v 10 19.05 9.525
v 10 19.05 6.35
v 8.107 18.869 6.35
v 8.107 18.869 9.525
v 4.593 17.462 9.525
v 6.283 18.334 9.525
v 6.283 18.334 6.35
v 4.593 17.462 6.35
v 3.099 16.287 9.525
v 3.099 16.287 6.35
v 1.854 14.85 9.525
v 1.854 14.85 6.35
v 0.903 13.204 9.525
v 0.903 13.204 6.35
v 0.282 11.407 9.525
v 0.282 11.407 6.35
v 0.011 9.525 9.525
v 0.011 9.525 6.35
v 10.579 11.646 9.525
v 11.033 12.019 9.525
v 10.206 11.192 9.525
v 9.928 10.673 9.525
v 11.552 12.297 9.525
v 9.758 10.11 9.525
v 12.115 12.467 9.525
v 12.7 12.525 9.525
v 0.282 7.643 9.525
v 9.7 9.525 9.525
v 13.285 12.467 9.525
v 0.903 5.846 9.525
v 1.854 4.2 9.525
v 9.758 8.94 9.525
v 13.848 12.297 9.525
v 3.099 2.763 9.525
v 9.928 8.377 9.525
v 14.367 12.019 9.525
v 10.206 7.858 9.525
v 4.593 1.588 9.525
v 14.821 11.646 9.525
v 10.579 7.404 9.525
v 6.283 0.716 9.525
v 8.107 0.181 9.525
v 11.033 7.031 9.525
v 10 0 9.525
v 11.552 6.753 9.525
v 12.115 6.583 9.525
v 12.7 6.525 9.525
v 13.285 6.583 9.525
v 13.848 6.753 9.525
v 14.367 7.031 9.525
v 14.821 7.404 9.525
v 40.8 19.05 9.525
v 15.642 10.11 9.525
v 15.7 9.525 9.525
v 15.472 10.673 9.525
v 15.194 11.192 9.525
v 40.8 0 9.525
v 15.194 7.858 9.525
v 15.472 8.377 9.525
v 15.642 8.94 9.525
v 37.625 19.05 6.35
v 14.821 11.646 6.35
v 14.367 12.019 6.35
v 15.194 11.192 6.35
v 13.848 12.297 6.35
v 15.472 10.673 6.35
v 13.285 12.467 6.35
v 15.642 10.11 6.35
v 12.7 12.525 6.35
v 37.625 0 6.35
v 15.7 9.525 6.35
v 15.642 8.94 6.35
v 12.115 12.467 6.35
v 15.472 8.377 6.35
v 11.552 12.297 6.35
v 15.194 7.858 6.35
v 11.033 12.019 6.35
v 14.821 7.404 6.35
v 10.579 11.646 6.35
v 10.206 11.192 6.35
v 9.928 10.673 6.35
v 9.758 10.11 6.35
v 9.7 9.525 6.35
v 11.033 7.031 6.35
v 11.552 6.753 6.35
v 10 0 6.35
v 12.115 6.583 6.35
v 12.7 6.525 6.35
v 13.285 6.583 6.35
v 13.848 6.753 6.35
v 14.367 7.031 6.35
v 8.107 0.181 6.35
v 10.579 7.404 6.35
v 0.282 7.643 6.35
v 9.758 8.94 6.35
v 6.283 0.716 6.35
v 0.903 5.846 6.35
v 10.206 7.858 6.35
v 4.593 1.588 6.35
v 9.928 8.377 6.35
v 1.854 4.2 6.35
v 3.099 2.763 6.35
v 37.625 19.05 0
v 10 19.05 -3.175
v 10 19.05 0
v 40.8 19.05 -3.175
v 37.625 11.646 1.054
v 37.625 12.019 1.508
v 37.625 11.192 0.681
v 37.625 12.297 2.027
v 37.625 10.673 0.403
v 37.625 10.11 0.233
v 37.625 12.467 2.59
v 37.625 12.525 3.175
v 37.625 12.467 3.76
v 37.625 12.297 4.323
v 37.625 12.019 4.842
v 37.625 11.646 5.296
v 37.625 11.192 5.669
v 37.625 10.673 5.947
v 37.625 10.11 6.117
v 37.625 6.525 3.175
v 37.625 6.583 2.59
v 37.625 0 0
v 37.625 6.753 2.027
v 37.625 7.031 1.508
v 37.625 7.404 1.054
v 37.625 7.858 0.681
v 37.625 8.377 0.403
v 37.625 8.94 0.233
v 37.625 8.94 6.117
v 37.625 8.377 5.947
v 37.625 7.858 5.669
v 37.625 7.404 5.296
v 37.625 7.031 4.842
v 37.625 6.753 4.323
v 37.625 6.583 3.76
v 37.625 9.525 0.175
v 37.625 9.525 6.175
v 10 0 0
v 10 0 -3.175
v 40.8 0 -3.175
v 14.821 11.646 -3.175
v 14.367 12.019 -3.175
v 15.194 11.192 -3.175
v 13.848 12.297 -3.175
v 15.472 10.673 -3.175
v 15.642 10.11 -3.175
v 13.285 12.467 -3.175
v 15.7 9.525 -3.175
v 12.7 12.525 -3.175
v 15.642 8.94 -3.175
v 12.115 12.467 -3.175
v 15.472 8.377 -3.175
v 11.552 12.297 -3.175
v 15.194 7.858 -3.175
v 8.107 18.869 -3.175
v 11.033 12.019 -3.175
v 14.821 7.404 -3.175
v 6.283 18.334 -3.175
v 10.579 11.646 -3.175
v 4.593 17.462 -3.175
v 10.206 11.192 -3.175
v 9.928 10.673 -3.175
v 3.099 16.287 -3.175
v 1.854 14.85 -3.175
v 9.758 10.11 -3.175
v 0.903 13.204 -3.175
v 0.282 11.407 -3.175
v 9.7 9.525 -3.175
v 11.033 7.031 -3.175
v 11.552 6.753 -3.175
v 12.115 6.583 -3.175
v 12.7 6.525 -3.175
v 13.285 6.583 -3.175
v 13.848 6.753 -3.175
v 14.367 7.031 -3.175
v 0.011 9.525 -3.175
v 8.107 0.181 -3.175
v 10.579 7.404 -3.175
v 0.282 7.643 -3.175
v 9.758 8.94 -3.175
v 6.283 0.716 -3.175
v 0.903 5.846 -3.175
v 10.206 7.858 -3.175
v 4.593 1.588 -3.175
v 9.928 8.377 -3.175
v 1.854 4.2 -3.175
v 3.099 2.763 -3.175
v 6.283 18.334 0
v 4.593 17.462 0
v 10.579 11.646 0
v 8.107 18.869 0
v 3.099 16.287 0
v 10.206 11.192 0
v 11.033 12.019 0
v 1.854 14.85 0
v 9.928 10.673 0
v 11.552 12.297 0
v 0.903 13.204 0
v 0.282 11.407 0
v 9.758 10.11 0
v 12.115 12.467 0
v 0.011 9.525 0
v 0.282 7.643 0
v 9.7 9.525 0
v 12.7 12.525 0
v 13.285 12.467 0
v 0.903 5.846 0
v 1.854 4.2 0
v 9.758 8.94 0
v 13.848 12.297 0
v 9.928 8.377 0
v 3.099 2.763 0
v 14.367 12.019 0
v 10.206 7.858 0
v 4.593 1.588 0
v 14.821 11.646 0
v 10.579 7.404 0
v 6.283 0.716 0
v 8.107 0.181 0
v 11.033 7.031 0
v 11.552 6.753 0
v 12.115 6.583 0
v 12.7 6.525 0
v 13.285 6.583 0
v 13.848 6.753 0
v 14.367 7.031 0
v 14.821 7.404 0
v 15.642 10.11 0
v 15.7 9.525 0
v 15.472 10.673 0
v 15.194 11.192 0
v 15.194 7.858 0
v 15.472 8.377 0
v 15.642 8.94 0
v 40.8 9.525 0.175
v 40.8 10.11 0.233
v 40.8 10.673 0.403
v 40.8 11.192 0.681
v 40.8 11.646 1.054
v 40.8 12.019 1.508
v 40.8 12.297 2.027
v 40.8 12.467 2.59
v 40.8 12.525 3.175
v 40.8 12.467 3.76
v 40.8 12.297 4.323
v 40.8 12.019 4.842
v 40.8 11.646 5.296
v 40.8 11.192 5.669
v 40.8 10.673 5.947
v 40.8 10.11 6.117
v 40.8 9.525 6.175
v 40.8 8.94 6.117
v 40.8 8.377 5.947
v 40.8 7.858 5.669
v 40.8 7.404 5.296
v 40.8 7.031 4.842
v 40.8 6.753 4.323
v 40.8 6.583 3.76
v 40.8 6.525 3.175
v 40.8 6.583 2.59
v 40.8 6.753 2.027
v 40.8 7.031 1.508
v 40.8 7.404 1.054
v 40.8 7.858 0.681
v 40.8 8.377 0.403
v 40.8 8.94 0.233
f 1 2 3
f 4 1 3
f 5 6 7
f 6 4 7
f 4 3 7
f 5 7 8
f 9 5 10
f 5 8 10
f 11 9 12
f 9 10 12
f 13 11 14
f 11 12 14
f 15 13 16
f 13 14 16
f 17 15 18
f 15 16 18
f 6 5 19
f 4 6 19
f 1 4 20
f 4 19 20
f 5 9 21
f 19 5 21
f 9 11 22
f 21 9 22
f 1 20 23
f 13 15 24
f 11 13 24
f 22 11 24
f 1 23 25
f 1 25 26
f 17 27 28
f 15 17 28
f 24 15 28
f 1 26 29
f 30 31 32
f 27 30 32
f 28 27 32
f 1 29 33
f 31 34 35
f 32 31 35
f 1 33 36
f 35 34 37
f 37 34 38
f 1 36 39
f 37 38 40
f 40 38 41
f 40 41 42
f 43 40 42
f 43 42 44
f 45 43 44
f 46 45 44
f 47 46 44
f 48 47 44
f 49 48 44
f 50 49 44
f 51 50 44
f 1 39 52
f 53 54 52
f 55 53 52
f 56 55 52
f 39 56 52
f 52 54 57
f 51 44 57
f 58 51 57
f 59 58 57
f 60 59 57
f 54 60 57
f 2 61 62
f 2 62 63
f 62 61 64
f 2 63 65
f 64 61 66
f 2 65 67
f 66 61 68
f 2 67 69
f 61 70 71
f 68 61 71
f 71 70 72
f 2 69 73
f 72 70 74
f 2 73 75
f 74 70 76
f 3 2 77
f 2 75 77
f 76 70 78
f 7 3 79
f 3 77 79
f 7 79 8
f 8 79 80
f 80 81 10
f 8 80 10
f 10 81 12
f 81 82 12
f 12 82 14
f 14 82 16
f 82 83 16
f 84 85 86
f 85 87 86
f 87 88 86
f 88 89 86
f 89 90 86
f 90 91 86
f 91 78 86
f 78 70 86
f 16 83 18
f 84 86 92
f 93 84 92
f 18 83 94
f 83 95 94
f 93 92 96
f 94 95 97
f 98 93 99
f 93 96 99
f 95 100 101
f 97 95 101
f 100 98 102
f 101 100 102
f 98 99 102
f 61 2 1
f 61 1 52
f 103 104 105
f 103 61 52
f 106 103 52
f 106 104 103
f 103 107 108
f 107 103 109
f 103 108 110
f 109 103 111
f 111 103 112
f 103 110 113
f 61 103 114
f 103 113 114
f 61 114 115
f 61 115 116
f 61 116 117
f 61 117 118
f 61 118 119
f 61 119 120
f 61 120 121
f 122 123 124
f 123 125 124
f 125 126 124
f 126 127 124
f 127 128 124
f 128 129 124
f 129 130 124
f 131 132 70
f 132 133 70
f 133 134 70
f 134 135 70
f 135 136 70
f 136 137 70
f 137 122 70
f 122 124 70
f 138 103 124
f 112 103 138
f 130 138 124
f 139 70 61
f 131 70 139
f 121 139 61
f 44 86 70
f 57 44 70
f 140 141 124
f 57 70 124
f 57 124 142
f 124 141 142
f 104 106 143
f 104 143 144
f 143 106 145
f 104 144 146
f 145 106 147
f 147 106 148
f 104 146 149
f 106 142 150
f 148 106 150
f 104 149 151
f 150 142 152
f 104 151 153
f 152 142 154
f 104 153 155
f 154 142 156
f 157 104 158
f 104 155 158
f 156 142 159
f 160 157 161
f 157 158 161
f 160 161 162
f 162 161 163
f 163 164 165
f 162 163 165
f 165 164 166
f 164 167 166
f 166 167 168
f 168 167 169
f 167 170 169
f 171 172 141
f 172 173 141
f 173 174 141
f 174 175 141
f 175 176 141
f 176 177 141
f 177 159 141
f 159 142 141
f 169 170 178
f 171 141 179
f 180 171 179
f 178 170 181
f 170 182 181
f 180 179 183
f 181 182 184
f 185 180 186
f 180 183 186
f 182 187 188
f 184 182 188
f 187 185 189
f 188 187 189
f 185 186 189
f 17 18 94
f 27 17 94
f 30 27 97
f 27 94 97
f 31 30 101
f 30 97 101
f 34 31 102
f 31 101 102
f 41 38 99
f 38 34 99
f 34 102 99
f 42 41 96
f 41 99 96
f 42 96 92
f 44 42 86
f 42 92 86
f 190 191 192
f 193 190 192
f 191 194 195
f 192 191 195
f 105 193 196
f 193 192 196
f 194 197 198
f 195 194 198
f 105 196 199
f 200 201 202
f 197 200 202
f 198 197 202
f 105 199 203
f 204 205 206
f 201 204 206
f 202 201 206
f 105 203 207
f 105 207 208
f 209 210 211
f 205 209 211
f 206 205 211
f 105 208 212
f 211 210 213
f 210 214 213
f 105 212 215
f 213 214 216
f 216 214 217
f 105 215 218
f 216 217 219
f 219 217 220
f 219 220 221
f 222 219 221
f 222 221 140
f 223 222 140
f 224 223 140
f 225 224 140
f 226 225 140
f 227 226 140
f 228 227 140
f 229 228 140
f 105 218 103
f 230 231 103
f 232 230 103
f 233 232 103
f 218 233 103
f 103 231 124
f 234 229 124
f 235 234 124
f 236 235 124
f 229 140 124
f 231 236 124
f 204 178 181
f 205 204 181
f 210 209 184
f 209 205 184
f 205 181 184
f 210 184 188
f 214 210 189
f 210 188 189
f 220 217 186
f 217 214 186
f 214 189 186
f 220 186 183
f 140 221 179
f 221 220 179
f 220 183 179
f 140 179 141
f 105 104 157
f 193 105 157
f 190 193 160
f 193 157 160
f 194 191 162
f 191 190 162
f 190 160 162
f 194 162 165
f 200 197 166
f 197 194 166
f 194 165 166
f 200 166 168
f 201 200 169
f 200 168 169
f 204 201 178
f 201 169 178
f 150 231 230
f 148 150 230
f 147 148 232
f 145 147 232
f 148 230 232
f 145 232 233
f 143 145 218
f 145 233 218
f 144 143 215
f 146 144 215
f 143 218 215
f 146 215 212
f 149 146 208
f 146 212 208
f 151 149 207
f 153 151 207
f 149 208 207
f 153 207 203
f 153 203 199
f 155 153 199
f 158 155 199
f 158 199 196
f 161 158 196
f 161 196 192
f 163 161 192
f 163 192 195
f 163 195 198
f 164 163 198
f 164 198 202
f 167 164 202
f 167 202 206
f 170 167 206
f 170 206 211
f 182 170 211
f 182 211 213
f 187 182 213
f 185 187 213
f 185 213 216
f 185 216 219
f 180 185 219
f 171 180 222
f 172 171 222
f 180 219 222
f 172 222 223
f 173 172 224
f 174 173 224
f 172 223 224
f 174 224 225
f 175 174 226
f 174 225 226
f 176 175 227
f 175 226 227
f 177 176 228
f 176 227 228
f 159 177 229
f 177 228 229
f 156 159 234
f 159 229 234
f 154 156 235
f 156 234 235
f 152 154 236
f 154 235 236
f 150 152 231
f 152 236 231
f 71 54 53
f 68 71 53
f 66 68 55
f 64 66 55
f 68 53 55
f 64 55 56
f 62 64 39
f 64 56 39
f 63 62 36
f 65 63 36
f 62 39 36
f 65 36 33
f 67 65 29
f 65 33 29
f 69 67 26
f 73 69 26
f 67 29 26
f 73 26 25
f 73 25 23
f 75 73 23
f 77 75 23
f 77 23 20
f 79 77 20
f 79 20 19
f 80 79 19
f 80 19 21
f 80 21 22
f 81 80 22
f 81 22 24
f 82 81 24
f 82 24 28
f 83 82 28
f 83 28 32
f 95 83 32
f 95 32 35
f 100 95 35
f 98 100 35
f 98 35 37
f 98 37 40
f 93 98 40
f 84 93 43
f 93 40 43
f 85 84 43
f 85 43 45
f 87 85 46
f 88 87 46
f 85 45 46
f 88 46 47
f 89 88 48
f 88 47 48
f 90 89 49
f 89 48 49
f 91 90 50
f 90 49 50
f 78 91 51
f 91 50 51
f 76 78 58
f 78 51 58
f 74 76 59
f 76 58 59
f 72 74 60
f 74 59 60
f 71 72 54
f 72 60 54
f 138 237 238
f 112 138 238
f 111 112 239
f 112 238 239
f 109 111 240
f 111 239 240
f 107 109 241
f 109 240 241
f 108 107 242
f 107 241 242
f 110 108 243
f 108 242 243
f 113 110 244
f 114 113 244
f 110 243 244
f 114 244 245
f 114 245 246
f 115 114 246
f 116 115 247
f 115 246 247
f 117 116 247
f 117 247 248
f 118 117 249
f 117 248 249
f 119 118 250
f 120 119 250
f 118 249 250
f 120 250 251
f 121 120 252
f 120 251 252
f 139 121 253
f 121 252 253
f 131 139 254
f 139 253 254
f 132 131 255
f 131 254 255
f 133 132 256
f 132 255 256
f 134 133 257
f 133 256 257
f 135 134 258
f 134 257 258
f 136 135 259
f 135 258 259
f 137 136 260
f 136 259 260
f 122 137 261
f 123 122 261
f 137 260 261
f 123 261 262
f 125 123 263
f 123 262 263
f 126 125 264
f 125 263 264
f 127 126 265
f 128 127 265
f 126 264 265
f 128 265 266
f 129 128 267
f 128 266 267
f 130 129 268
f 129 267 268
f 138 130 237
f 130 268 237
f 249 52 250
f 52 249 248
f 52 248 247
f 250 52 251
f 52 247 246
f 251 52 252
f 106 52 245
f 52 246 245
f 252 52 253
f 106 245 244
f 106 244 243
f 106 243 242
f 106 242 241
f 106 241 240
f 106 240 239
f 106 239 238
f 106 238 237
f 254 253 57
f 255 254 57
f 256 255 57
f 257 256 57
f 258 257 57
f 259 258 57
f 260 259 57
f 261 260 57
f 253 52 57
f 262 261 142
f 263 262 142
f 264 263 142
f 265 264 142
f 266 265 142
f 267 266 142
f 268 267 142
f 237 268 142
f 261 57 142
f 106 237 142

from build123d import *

# Parameters (mm, degrees)
BOSS_EXTRUDE1_DEPTH = 19.05
SKETCH2_R           = 3
CUT_EXTRUDE1_DEPTH  = 3.175
CUT_EXTRUDE2_REACH  = 48.785
SKETCH3_R           = 3
FILLET1_R           = 10


with BuildPart() as part:
    # Sketch1 → Boss-Extrude1 (new body)
    with BuildSketch(Plane(origin=(0, 0, 0), x_dir=(1, 0, 0), z_dir=(0, 1, 0))):
        Polygon((0, 0), (37.625, 0), (37.625, -6.35), (0, -6.35), (0, -9.525), (40.8, -9.525), (40.8, 3.175), (0, 3.175), align=None)
    extrude(amount=BOSS_EXTRUDE1_DEPTH)

    # Sketch2 → Cut-Extrude1 (cut)
    with BuildSketch(Plane(origin=(40.8, 0, 0), x_dir=(0, 0, -1), z_dir=(1, 0, 0))):
        with Locations((-3.175, 9.525)):
            Circle(SKETCH2_R)
    extrude(amount=-CUT_EXTRUDE1_DEPTH, mode=Mode.SUBTRACT)

    # Cut-Extrude2: up to this face of the body (flat: up to its plane)
    cut_extrude2_end = Plane(part.part.faces().sort_by_distance((20.4, 9.525, -3.175))[0])
    # Sketch3 → Cut-Extrude2 (cut, up to the picked face)
    with BuildSketch(Plane.XY.offset(9.525), mode=Mode.PRIVATE) as cut_extrude2_sk1:
        with Locations((12.7, 9.525)):
            Circle(SKETCH3_R)
    cut_extrude2_tool1 = split(extrude(cut_extrude2_sk1.sketch, amount=-CUT_EXTRUDE2_REACH, mode=Mode.PRIVATE), bisect_by=cut_extrude2_end, keep=Keep.BOTH, mode=Mode.PRIVATE)
    add(cut_extrude2_tool1.solids().sort_by(Axis((12.7, 9.525, 9.525), (0, 0, -1)))[0], mode=Mode.SUBTRACT)

    # Fillet1
    # the kernel refuses this fillet: 10 mm, written as the material it takes off along each edge
    with BuildSketch(Plane(origin=(0, 0, -28.175), x_dir=(0, 1, 0), z_dir=(0, 0, 1)), Plane(origin=(0, 19.05, -18.65), x_dir=(1, 0, 0), z_dir=(0, 0, 1))) as fillet1_piece_1:
        with BuildLine():
            CenterArc((FILLET1_R, -FILLET1_R), FILLET1_R, 90, 90)
            Line((0, -FILLET1_R), (0, 0))
            Line((0, 0), (FILLET1_R, 0))
        make_face()
    extrude(amount=53.175, mode=Mode.SUBTRACT)
    with BuildSketch(Plane(origin=(0, 19.05, -28.175), x_dir=(0, -1, 0), z_dir=(0, 0, 1)), Plane(origin=(0, 0, -18.65), x_dir=(1, 0, 0), z_dir=(0, 0, 1))) as fillet1_piece_2:
        with BuildLine():
            CenterArc((FILLET1_R, FILLET1_R), FILLET1_R, 180, 90)
            Line((0, FILLET1_R), (0, 0))
            Line((0, 0), (FILLET1_R, 0))
        make_face()
    extrude(amount=53.175, mode=Mode.SUBTRACT)


solid = part.part
